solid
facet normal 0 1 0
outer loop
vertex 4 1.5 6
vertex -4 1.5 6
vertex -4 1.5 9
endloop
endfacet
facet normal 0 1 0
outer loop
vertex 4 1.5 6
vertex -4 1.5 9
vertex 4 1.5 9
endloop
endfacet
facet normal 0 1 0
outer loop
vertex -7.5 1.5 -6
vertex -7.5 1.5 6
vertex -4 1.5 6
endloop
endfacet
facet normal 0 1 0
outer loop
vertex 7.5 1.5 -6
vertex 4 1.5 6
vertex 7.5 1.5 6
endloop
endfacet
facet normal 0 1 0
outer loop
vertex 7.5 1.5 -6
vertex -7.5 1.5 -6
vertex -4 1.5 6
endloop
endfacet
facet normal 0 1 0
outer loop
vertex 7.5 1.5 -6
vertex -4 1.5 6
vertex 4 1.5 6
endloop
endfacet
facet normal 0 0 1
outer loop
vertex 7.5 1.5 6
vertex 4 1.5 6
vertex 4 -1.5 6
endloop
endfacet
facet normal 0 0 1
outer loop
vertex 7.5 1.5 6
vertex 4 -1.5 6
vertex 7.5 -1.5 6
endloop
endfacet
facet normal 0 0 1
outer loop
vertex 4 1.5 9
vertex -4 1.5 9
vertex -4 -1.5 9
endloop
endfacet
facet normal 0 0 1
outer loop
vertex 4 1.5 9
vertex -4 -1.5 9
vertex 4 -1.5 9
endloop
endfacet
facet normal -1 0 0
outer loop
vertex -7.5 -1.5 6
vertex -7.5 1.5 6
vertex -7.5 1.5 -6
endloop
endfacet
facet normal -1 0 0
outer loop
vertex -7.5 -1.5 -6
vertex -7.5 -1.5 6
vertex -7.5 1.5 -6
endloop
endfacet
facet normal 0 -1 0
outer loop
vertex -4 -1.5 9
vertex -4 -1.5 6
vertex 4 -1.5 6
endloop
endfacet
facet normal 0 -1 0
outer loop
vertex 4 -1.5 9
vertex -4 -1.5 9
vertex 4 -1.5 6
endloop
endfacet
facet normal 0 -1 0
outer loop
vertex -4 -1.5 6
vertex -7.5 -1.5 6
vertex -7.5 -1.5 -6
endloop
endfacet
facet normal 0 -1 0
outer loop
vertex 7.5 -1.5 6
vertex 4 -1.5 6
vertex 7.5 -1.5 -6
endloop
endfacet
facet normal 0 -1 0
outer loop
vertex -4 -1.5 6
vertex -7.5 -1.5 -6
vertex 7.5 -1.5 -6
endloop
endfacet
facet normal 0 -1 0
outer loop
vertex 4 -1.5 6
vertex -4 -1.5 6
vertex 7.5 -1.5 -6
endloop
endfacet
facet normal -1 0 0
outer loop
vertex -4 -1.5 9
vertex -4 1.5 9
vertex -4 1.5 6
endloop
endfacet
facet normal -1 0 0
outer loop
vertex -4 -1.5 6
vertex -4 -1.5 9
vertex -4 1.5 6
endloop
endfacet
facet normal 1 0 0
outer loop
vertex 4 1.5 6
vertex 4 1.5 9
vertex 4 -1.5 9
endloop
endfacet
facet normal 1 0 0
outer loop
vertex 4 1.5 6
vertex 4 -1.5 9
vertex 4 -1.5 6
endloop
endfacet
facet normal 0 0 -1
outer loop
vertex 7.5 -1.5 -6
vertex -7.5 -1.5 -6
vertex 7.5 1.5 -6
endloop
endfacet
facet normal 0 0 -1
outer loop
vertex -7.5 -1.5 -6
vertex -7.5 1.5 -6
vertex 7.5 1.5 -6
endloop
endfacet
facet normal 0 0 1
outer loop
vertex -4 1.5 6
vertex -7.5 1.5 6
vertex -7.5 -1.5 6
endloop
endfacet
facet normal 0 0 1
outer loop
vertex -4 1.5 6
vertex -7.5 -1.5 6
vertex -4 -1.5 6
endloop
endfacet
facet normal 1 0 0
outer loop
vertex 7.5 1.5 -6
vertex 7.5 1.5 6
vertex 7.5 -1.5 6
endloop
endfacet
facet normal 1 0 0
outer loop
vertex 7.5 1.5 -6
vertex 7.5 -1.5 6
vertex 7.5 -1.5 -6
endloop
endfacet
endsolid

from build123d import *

# Parameters (mm, degrees)
SKETCH6_W           = 15
SKETCH6_H           = 12
BOSS_EXTRUDE4_DEPTH = 1.5
SKETCH8_W           = 8
SKETCH8_H           = 3
BOSS_EXTRUDE5_DEPTH = 1.5


with BuildPart() as part:
    # Sketch6 → Boss-Extrude4 (new body, symmetric)
    with BuildSketch(Plane(origin=(0, 0, 0), x_dir=(1, 0, 0), z_dir=(0, 1, 0))):
        Rectangle(SKETCH6_W, SKETCH6_H)
    extrude(amount=BOSS_EXTRUDE4_DEPTH, both=True)

    # Sketch8 → Boss-Extrude5 (add, symmetric)
    with BuildSketch(Plane(origin=(0, 0, 0), x_dir=(1, 0, 0), z_dir=(0, 1, 0))):
        with Locations((0, -7.5)):
            Rectangle(SKETCH8_W, SKETCH8_H)
    extrude(amount=BOSS_EXTRUDE5_DEPTH, both=True)


solid = part.part
